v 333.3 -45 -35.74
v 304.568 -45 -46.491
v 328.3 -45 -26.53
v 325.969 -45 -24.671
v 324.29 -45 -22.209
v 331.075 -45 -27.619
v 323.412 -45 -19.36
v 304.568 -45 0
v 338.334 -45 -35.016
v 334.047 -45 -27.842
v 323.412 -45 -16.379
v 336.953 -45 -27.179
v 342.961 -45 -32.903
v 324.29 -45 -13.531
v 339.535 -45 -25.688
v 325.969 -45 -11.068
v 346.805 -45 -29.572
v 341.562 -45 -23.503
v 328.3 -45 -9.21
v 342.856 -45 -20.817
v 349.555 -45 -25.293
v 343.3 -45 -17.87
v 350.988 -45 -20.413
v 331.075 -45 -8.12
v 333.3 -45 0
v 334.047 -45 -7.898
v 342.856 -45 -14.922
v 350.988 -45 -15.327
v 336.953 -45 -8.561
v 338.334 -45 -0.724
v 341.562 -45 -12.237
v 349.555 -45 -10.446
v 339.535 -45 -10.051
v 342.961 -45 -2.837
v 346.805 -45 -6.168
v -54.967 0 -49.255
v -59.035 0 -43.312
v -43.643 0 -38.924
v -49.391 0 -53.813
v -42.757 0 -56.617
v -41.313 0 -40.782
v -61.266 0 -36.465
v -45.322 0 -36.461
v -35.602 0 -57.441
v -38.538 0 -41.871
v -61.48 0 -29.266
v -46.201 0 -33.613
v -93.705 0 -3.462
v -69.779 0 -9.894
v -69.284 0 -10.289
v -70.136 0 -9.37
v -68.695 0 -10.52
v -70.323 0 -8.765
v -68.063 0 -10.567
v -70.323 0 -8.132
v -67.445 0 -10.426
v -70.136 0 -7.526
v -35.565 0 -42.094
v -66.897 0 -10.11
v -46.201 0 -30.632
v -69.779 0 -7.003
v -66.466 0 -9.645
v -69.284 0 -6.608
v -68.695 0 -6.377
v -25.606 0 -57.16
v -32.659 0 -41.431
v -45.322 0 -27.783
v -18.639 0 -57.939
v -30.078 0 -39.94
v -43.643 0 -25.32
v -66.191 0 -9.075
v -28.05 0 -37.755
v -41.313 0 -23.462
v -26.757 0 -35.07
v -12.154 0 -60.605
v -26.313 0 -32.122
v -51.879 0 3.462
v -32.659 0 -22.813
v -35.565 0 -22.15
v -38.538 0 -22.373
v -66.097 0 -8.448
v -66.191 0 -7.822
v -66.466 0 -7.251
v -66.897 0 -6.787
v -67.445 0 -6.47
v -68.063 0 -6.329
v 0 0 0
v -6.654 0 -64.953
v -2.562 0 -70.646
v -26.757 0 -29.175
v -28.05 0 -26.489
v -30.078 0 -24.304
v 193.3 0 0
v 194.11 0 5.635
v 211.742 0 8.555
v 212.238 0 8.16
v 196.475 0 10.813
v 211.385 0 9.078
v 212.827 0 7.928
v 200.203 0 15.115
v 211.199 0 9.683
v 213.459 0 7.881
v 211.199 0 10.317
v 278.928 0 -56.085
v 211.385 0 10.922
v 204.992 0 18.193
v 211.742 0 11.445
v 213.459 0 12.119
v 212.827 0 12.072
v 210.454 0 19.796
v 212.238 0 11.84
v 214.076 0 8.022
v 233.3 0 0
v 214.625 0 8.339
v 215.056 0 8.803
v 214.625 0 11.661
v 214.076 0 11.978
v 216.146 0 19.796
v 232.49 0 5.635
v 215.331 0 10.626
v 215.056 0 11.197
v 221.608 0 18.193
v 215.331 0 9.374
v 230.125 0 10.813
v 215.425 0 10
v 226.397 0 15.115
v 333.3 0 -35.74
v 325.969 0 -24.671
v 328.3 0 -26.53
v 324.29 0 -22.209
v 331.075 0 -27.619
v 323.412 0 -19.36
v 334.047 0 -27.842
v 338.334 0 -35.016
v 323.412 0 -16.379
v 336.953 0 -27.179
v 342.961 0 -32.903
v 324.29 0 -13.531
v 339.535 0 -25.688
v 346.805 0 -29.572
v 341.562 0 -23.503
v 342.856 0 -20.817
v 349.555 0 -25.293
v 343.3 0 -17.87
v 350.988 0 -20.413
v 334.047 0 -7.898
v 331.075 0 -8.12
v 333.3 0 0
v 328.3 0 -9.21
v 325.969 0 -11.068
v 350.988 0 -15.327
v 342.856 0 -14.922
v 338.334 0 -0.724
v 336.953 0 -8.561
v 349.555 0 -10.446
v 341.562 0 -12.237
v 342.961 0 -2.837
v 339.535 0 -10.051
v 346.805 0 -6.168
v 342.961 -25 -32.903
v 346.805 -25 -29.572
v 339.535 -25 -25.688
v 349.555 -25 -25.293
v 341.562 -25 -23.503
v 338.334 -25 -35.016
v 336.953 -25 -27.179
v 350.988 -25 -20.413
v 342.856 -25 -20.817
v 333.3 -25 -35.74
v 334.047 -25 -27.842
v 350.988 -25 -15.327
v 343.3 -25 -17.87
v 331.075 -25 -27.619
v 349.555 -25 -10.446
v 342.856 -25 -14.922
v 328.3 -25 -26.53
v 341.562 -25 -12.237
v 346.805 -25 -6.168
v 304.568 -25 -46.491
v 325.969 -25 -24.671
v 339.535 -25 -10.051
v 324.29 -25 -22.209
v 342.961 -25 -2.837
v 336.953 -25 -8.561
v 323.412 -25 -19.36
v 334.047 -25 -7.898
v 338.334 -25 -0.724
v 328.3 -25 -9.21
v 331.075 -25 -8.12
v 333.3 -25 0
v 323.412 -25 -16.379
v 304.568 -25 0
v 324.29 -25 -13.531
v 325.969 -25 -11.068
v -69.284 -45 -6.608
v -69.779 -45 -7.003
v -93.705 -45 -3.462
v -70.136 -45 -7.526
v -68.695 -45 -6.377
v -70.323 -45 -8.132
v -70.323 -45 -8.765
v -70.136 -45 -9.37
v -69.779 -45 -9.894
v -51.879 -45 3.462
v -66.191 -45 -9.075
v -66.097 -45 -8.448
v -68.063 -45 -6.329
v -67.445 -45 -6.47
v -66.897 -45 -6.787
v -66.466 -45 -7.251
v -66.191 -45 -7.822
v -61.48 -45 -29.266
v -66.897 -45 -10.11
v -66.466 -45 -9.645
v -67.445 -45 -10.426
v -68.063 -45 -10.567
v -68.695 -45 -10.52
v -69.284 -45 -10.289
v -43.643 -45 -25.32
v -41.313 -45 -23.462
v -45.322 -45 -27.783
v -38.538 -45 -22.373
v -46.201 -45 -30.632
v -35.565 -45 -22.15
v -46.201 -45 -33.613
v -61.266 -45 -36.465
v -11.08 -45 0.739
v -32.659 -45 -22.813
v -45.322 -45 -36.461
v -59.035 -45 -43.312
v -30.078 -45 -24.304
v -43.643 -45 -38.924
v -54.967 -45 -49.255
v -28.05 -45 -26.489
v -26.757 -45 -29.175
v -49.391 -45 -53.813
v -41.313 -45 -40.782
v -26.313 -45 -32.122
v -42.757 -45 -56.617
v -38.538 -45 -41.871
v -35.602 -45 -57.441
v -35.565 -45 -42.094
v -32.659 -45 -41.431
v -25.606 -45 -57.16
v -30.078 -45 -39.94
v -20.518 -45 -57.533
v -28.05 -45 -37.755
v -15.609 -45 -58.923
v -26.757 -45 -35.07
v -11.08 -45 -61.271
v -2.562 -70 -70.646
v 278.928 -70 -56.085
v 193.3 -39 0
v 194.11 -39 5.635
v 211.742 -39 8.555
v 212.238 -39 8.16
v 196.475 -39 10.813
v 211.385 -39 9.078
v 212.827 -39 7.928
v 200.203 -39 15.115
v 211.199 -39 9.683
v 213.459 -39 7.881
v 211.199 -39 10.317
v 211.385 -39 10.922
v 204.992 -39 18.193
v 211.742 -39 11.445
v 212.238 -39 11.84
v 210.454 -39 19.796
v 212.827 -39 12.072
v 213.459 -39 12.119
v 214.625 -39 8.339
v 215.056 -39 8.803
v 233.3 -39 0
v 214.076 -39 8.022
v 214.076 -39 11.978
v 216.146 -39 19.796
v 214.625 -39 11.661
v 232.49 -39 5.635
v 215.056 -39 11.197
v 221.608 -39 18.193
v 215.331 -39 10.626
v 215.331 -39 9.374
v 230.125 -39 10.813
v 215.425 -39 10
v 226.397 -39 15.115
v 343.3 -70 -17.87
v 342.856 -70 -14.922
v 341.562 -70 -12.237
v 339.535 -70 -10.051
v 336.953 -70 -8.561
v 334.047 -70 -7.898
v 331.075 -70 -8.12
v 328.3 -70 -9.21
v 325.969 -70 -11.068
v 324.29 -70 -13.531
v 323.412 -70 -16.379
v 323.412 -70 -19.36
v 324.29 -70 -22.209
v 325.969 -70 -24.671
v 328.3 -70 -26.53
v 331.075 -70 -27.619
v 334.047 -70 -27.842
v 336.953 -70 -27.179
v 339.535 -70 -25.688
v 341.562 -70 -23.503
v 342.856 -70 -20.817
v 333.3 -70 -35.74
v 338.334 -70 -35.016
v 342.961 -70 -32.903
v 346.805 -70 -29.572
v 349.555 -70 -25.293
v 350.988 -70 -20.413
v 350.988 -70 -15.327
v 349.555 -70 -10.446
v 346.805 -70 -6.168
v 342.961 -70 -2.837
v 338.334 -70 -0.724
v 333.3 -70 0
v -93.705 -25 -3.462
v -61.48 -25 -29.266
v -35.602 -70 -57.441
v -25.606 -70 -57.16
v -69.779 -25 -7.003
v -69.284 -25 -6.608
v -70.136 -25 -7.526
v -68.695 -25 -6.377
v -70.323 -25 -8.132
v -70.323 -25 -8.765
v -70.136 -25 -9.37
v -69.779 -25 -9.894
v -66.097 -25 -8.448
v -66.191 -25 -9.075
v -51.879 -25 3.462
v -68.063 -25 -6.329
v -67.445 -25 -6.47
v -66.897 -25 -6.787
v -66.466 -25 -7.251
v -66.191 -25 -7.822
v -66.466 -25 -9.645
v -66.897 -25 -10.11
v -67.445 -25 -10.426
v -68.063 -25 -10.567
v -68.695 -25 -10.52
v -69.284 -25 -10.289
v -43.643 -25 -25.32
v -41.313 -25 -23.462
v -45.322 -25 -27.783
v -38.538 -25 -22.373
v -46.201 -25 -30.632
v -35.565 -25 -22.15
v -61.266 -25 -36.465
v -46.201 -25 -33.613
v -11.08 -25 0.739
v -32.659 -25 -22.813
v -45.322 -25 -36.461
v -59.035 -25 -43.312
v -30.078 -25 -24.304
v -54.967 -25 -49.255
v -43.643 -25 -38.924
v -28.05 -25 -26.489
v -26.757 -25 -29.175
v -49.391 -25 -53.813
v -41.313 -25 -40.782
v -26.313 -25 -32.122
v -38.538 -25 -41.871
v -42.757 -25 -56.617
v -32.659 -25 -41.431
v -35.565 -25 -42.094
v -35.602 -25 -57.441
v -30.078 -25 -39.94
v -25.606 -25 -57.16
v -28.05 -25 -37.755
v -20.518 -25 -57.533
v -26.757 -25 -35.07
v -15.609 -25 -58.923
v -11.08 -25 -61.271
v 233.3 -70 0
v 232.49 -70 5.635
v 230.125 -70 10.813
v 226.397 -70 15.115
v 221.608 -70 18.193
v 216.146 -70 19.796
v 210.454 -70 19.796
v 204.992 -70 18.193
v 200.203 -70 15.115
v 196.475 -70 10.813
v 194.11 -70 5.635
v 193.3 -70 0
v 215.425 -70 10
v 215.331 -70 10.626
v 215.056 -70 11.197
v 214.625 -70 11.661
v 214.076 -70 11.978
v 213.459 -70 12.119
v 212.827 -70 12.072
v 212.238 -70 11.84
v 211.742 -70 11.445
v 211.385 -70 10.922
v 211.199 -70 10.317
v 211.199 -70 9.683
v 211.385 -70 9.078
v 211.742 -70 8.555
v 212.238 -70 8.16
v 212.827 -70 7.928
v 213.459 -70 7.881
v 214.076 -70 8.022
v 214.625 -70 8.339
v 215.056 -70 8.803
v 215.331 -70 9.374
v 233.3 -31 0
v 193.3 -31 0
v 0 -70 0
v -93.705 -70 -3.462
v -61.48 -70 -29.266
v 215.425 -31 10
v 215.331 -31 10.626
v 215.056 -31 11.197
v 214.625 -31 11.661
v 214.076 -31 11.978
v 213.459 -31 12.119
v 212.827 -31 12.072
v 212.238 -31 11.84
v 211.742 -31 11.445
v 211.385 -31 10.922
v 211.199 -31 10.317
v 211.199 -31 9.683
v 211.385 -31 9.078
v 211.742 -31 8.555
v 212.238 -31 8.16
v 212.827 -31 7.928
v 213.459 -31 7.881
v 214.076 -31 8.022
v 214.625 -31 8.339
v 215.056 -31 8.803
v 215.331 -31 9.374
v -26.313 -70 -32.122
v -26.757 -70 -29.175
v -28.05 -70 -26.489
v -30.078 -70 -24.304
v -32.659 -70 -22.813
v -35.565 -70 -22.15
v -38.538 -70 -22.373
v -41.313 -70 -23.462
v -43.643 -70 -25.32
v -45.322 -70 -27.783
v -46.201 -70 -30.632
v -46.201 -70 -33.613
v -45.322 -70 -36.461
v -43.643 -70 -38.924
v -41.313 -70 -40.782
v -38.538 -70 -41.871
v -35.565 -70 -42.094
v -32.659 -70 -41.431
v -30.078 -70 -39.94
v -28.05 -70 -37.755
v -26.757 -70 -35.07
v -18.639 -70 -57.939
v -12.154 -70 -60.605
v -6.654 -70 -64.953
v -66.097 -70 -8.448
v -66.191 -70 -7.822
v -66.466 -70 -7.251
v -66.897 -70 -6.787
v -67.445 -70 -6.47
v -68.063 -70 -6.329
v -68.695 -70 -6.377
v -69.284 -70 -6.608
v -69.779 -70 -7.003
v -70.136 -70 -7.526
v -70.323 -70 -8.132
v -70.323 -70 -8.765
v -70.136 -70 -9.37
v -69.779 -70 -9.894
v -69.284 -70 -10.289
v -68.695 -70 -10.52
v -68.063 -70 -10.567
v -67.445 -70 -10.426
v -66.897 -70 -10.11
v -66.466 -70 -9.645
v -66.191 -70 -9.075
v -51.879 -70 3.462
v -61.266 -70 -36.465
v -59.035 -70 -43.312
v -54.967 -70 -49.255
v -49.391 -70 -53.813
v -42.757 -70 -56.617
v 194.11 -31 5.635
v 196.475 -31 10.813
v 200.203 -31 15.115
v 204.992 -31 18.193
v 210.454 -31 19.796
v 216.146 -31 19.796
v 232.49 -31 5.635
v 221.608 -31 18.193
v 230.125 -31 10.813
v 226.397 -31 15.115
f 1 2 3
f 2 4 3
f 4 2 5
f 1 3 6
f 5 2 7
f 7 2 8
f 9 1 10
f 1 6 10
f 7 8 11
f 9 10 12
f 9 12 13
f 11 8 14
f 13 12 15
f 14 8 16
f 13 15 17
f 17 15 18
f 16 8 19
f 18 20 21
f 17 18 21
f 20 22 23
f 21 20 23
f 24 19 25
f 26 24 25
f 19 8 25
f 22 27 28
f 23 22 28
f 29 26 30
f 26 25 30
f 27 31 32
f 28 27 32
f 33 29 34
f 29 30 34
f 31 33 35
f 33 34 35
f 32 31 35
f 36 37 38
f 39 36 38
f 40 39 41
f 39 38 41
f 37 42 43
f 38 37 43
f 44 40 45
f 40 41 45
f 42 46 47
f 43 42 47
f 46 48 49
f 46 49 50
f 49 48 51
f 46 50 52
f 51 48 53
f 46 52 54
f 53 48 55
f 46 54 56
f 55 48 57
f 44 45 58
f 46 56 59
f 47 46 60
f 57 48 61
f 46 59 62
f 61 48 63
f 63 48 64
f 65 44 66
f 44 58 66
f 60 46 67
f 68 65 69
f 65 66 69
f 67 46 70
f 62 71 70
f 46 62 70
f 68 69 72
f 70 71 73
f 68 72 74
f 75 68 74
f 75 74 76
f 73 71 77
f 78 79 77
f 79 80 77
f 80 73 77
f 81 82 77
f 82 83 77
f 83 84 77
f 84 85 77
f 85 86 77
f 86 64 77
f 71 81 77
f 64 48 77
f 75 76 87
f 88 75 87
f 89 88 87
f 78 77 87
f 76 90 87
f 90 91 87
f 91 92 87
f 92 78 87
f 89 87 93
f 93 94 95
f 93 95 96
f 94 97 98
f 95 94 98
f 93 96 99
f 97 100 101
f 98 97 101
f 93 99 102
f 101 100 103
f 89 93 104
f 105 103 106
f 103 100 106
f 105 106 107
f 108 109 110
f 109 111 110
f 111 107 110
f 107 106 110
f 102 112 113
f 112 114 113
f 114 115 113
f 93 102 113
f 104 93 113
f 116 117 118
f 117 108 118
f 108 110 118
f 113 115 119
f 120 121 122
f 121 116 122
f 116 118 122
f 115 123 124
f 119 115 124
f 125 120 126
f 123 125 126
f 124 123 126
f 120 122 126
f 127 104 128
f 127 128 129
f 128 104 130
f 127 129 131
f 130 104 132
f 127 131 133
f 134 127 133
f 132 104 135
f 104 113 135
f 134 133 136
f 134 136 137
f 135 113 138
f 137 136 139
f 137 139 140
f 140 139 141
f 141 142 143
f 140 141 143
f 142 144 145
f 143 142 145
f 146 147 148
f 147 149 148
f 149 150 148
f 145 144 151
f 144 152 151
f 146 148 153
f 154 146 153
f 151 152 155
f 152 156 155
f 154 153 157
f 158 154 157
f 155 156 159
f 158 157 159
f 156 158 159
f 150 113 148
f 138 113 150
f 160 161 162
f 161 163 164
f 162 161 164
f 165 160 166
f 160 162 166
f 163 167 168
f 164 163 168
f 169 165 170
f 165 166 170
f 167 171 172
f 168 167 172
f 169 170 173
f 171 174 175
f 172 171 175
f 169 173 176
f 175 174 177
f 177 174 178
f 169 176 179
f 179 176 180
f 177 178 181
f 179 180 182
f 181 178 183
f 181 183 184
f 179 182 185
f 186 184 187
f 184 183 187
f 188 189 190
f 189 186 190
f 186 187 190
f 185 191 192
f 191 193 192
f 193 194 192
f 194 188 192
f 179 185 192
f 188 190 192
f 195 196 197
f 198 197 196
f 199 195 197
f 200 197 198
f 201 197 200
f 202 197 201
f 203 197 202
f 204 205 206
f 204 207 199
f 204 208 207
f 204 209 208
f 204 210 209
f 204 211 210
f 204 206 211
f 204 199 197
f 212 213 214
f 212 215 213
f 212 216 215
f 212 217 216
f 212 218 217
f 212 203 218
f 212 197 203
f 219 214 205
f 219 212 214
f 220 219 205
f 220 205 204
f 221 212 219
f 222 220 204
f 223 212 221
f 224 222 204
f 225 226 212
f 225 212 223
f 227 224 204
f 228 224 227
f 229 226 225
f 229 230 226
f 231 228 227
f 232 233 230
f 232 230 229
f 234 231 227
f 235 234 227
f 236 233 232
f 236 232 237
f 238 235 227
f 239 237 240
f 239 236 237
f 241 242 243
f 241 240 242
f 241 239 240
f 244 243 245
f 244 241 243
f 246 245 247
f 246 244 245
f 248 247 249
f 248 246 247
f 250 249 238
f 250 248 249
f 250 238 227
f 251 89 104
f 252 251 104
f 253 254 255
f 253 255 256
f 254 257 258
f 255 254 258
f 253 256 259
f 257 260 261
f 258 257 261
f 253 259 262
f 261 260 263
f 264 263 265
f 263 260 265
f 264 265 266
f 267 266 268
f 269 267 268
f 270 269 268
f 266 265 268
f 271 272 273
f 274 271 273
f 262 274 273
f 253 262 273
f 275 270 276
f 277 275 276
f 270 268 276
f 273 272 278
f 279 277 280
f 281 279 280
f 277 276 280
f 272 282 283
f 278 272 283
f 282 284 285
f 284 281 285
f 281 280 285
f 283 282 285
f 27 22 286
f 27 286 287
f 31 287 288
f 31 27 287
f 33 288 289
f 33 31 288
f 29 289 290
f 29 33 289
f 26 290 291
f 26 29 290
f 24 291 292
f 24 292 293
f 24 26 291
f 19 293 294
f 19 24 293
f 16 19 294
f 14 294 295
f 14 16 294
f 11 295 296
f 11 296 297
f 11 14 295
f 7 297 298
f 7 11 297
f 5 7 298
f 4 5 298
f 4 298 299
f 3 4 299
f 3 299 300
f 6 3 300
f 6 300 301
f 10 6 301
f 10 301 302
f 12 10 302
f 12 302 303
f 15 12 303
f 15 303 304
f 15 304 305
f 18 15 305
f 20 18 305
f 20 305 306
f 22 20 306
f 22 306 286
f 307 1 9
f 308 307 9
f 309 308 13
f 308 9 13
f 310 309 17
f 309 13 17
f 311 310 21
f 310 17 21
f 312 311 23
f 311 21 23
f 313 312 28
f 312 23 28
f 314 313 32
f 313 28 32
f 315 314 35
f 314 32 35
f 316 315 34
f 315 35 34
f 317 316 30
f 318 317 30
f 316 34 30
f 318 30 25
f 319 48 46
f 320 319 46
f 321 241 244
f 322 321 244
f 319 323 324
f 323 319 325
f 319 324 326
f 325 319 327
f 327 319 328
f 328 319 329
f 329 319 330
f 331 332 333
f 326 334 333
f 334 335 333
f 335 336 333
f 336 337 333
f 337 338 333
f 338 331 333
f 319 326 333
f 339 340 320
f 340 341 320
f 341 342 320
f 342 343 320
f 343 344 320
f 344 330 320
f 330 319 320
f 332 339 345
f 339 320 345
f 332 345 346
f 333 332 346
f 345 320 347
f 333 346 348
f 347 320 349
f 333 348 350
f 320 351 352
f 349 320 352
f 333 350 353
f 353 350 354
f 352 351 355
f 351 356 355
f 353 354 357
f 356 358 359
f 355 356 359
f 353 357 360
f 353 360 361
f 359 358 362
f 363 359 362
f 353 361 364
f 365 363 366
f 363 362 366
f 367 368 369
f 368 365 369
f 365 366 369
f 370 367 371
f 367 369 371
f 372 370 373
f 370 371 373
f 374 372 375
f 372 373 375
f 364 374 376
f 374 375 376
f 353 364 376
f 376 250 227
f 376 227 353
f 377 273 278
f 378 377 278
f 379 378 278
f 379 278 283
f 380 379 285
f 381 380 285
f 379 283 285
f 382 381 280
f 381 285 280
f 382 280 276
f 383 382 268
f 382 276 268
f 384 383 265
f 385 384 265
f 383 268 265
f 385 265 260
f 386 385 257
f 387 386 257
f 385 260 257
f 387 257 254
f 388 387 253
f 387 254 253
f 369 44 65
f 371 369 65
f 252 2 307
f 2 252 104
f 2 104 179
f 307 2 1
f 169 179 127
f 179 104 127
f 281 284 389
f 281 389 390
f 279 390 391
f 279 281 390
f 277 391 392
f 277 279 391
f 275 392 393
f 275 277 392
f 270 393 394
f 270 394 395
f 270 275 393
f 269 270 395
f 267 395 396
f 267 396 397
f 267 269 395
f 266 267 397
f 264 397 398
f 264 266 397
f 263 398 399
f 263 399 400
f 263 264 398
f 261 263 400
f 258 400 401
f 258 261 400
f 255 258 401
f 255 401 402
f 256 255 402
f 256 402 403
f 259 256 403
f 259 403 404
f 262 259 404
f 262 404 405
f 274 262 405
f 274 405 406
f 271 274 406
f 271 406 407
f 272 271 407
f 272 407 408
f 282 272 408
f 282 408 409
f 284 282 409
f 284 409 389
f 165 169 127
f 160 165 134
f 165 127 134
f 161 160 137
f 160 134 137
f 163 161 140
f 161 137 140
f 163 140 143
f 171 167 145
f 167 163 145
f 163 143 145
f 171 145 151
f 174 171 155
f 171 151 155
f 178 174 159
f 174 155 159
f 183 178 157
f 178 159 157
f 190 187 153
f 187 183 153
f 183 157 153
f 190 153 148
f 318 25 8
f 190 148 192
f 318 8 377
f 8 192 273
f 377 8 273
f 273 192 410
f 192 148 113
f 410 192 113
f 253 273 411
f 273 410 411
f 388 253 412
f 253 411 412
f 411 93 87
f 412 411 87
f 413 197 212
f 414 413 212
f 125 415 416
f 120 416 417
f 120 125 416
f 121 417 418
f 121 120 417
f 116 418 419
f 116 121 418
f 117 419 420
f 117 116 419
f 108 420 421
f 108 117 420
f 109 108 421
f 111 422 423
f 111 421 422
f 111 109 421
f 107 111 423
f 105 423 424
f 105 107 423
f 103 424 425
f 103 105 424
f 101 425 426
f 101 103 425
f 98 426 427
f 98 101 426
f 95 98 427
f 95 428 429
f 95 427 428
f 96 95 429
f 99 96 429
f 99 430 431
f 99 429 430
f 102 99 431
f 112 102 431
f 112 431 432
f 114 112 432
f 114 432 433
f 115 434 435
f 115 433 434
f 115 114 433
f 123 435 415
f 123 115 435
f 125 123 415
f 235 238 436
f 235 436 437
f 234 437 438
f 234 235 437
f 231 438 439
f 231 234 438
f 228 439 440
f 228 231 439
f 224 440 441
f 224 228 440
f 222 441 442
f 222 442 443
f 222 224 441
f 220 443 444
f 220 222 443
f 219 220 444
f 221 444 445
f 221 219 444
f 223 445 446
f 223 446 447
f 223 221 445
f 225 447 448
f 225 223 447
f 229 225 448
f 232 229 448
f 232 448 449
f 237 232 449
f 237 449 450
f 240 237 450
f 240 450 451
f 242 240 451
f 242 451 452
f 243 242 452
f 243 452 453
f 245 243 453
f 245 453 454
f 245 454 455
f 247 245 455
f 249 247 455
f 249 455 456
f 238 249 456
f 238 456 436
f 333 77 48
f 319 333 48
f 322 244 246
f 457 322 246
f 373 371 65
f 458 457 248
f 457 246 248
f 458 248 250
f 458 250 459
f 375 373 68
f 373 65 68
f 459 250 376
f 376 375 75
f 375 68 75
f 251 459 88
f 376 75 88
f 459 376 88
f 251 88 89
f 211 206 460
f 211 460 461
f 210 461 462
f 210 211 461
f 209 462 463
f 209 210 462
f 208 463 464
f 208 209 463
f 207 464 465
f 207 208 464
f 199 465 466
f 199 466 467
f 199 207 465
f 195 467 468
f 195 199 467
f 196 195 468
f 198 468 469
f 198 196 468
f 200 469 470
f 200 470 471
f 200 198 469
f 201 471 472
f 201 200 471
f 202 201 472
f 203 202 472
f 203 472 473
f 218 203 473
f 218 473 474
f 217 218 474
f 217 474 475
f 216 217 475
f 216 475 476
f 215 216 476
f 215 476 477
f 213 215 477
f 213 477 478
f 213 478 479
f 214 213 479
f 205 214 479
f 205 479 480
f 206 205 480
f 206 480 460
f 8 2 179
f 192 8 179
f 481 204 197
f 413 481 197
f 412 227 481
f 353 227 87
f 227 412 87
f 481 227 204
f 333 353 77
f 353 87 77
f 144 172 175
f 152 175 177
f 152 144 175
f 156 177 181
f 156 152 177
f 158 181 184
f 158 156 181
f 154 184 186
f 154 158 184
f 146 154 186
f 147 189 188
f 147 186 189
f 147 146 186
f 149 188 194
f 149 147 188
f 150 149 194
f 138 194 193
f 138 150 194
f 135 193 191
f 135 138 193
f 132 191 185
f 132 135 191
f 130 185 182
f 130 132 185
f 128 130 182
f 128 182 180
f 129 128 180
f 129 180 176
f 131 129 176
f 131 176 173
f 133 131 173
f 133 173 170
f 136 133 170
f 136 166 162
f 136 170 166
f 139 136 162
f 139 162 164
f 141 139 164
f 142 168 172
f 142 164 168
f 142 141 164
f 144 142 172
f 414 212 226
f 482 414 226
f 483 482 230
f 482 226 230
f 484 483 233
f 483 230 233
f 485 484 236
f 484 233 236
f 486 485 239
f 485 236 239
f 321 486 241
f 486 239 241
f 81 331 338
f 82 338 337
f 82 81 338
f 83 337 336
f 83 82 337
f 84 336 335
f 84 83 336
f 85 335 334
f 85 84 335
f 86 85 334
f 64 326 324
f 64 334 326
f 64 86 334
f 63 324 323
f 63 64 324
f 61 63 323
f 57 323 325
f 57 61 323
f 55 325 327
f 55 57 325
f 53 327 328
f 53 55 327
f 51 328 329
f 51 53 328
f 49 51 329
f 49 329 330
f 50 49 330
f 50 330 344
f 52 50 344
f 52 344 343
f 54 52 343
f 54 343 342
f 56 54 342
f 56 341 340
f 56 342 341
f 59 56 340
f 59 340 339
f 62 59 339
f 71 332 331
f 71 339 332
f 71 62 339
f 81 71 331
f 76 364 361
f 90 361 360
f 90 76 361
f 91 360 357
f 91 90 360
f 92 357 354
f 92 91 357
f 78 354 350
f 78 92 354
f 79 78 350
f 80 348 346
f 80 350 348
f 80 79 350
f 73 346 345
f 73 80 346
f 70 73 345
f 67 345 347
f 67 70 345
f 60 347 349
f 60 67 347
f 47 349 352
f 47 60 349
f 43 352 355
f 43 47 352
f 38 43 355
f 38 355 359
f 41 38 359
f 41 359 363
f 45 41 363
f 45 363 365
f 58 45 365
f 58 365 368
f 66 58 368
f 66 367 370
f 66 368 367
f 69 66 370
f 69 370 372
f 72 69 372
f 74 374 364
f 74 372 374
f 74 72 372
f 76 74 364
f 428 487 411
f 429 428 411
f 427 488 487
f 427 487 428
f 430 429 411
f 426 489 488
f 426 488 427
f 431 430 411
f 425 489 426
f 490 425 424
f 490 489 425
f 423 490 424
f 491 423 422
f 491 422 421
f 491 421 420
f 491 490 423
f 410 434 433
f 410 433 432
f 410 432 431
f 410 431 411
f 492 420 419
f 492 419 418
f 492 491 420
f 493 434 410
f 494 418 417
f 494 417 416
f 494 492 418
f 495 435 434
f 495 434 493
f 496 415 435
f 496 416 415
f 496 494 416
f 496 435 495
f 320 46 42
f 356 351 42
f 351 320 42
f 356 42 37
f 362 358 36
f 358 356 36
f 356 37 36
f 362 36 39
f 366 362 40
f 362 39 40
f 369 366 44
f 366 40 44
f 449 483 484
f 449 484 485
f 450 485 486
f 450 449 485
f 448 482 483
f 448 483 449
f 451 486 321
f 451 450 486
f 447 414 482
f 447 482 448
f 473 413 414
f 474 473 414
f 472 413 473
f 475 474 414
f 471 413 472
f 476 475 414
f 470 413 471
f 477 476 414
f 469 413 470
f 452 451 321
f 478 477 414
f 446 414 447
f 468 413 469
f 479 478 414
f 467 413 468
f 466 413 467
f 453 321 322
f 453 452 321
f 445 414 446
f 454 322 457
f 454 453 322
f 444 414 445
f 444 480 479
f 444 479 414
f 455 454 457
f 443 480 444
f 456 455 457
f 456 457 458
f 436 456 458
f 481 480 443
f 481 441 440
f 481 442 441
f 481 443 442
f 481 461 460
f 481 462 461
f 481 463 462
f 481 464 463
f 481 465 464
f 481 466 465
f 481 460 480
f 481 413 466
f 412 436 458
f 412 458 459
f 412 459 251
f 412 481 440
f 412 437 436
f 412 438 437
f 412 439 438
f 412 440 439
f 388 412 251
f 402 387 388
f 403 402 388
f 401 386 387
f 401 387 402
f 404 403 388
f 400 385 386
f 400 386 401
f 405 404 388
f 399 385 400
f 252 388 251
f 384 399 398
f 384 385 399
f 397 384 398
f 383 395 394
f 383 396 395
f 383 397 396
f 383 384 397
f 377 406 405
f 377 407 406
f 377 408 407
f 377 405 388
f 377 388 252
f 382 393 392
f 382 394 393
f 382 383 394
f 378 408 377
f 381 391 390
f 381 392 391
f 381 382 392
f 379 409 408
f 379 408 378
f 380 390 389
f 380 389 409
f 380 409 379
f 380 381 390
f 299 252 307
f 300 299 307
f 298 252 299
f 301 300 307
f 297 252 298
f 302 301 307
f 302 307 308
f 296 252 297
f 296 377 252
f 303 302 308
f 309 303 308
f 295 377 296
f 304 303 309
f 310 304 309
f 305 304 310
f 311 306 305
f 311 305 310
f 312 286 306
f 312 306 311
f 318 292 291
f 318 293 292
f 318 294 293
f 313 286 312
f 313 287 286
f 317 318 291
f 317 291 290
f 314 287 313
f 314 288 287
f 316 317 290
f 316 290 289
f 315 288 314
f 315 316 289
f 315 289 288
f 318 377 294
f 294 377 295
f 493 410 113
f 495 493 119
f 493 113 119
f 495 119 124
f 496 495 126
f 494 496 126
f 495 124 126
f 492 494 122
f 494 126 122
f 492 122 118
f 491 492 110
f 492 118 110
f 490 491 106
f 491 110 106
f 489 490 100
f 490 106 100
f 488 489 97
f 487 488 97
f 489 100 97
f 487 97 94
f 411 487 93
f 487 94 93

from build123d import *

# Parameters (mm, degrees)
F1_R          = 10
F1_R_2        = 2.125
F2_DEPTH      = 70
F3_W          = 130.2564469211
F3_H          = 20
F3_W_2        = 25.4596173763
F3_W_3        = 28.8759171963
F4_DEPTH      = 100
F4_DEPTH_BACK = 100
F5_R          = 2.125
F6_DEPTH      = 70
F9_DEPTH      = 4


with BuildPart() as f2:
    # F1 (on Front) → F2 (new body)
    with BuildSketch(Plane.XZ):
        with BuildLine():
            Line((333.3, 0), (0, 0))
            Line((0, 0), (-40.7109649446, -7.1784415304))
            ThreePointArc((-40.7109649446, -7.1784415304), (-54.7650426184, -14.7715124925), (-61.4796391993, -29.2658568603))
            ThreePointArc((-61.4796391993, -29.2658568603), (-54.9671092091, -49.2553101365), (-35.6024128261, -57.4406521057))
            Line((-35.6024128261, -57.4406521057), (-25.606345873, -57.1602141095))
            ThreePointArc((-25.606345873, -57.1602141095), (-12.1544941746, -60.6052272274), (-2.5623294895, -70.6456856906))
            Line((-2.5623294895, -70.6456856906), (278.9276717153, -56.0849576382))
            Line((278.9276717153, -56.0849576382), (333.3, -35.7395332009))
            ThreePointArc((333.3, -35.7395332009), (351.1697666005, -17.8697666005), (333.3, 0))
        make_face()
        with Locations((-36.3127197699, -32.1221294279)):
            Circle(F1_R, mode=Mode.SUBTRACT)
        with Locations((333.3, -17.8697666005)):
            Circle(F1_R, mode=Mode.SUBTRACT)
        with BuildLine():
            Line((-40.7109649446, -7.1784415304), (0, 0))
            Line((0, 0), (-51.8790856004, 3.4624293912))
            Line((-51.8790856004, 3.4624293912), (-93.7052443624, -3.4624293912))
            Line((-93.7052443624, -3.4624293912), (-61.4796391993, -29.2658568603))
            ThreePointArc((-61.4796391993, -29.2658568603), (-54.7650426184, -14.7715124925), (-40.7109649446, -7.1784415304))
        make_face()
        with Locations((-68.2217553258, -8.4483278915)):
            Circle(F1_R_2, mode=Mode.SUBTRACT)
    extrude(amount=F2_DEPTH)

    # F3 (on Top) → F4 (cut, two sides)
    with BuildSketch(Plane.XY) as f4_sk:
        with Locations((-76.2078319233, -35)):
            Rectangle(F3_W, F3_H)
        with Locations((346.1741060019, -35)):
            Rectangle(F3_W_2, F3_H)
        with Locations((319.0063387156, -35)):
            Rectangle(F3_W_3, F3_H)
    extrude(amount=F4_DEPTH, mode=Mode.SUBTRACT)
    extrude(f4_sk.sketch, amount=-F4_DEPTH_BACK, mode=Mode.SUBTRACT)

    # F5 (on Front) → F6 (join)
    with BuildSketch(Plane.XZ):
        with BuildLine():
            Line((213.3, 0), (233.3, 0))
            ThreePointArc((233.3, 0), (213.3, 20), (193.3, 0))
            Line((193.3, 0), (213.3, 0))
        make_face()
        with Locations((213.3, 10)):
            Circle(F5_R, mode=Mode.SUBTRACT)
    extrude(amount=F6_DEPTH)

    # F8 (on offset) → F9 (cut, symmetric)
    with BuildSketch(Plane.XZ.offset(35)):
        with BuildLine():
            Line((193.3, 0), (233.3, 0))
            ThreePointArc((233.3, 0), (213.3, 20), (193.3, 0))
        make_face()
    extrude(amount=F9_DEPTH, both=True, mode=Mode.SUBTRACT)


solid = f2.part
